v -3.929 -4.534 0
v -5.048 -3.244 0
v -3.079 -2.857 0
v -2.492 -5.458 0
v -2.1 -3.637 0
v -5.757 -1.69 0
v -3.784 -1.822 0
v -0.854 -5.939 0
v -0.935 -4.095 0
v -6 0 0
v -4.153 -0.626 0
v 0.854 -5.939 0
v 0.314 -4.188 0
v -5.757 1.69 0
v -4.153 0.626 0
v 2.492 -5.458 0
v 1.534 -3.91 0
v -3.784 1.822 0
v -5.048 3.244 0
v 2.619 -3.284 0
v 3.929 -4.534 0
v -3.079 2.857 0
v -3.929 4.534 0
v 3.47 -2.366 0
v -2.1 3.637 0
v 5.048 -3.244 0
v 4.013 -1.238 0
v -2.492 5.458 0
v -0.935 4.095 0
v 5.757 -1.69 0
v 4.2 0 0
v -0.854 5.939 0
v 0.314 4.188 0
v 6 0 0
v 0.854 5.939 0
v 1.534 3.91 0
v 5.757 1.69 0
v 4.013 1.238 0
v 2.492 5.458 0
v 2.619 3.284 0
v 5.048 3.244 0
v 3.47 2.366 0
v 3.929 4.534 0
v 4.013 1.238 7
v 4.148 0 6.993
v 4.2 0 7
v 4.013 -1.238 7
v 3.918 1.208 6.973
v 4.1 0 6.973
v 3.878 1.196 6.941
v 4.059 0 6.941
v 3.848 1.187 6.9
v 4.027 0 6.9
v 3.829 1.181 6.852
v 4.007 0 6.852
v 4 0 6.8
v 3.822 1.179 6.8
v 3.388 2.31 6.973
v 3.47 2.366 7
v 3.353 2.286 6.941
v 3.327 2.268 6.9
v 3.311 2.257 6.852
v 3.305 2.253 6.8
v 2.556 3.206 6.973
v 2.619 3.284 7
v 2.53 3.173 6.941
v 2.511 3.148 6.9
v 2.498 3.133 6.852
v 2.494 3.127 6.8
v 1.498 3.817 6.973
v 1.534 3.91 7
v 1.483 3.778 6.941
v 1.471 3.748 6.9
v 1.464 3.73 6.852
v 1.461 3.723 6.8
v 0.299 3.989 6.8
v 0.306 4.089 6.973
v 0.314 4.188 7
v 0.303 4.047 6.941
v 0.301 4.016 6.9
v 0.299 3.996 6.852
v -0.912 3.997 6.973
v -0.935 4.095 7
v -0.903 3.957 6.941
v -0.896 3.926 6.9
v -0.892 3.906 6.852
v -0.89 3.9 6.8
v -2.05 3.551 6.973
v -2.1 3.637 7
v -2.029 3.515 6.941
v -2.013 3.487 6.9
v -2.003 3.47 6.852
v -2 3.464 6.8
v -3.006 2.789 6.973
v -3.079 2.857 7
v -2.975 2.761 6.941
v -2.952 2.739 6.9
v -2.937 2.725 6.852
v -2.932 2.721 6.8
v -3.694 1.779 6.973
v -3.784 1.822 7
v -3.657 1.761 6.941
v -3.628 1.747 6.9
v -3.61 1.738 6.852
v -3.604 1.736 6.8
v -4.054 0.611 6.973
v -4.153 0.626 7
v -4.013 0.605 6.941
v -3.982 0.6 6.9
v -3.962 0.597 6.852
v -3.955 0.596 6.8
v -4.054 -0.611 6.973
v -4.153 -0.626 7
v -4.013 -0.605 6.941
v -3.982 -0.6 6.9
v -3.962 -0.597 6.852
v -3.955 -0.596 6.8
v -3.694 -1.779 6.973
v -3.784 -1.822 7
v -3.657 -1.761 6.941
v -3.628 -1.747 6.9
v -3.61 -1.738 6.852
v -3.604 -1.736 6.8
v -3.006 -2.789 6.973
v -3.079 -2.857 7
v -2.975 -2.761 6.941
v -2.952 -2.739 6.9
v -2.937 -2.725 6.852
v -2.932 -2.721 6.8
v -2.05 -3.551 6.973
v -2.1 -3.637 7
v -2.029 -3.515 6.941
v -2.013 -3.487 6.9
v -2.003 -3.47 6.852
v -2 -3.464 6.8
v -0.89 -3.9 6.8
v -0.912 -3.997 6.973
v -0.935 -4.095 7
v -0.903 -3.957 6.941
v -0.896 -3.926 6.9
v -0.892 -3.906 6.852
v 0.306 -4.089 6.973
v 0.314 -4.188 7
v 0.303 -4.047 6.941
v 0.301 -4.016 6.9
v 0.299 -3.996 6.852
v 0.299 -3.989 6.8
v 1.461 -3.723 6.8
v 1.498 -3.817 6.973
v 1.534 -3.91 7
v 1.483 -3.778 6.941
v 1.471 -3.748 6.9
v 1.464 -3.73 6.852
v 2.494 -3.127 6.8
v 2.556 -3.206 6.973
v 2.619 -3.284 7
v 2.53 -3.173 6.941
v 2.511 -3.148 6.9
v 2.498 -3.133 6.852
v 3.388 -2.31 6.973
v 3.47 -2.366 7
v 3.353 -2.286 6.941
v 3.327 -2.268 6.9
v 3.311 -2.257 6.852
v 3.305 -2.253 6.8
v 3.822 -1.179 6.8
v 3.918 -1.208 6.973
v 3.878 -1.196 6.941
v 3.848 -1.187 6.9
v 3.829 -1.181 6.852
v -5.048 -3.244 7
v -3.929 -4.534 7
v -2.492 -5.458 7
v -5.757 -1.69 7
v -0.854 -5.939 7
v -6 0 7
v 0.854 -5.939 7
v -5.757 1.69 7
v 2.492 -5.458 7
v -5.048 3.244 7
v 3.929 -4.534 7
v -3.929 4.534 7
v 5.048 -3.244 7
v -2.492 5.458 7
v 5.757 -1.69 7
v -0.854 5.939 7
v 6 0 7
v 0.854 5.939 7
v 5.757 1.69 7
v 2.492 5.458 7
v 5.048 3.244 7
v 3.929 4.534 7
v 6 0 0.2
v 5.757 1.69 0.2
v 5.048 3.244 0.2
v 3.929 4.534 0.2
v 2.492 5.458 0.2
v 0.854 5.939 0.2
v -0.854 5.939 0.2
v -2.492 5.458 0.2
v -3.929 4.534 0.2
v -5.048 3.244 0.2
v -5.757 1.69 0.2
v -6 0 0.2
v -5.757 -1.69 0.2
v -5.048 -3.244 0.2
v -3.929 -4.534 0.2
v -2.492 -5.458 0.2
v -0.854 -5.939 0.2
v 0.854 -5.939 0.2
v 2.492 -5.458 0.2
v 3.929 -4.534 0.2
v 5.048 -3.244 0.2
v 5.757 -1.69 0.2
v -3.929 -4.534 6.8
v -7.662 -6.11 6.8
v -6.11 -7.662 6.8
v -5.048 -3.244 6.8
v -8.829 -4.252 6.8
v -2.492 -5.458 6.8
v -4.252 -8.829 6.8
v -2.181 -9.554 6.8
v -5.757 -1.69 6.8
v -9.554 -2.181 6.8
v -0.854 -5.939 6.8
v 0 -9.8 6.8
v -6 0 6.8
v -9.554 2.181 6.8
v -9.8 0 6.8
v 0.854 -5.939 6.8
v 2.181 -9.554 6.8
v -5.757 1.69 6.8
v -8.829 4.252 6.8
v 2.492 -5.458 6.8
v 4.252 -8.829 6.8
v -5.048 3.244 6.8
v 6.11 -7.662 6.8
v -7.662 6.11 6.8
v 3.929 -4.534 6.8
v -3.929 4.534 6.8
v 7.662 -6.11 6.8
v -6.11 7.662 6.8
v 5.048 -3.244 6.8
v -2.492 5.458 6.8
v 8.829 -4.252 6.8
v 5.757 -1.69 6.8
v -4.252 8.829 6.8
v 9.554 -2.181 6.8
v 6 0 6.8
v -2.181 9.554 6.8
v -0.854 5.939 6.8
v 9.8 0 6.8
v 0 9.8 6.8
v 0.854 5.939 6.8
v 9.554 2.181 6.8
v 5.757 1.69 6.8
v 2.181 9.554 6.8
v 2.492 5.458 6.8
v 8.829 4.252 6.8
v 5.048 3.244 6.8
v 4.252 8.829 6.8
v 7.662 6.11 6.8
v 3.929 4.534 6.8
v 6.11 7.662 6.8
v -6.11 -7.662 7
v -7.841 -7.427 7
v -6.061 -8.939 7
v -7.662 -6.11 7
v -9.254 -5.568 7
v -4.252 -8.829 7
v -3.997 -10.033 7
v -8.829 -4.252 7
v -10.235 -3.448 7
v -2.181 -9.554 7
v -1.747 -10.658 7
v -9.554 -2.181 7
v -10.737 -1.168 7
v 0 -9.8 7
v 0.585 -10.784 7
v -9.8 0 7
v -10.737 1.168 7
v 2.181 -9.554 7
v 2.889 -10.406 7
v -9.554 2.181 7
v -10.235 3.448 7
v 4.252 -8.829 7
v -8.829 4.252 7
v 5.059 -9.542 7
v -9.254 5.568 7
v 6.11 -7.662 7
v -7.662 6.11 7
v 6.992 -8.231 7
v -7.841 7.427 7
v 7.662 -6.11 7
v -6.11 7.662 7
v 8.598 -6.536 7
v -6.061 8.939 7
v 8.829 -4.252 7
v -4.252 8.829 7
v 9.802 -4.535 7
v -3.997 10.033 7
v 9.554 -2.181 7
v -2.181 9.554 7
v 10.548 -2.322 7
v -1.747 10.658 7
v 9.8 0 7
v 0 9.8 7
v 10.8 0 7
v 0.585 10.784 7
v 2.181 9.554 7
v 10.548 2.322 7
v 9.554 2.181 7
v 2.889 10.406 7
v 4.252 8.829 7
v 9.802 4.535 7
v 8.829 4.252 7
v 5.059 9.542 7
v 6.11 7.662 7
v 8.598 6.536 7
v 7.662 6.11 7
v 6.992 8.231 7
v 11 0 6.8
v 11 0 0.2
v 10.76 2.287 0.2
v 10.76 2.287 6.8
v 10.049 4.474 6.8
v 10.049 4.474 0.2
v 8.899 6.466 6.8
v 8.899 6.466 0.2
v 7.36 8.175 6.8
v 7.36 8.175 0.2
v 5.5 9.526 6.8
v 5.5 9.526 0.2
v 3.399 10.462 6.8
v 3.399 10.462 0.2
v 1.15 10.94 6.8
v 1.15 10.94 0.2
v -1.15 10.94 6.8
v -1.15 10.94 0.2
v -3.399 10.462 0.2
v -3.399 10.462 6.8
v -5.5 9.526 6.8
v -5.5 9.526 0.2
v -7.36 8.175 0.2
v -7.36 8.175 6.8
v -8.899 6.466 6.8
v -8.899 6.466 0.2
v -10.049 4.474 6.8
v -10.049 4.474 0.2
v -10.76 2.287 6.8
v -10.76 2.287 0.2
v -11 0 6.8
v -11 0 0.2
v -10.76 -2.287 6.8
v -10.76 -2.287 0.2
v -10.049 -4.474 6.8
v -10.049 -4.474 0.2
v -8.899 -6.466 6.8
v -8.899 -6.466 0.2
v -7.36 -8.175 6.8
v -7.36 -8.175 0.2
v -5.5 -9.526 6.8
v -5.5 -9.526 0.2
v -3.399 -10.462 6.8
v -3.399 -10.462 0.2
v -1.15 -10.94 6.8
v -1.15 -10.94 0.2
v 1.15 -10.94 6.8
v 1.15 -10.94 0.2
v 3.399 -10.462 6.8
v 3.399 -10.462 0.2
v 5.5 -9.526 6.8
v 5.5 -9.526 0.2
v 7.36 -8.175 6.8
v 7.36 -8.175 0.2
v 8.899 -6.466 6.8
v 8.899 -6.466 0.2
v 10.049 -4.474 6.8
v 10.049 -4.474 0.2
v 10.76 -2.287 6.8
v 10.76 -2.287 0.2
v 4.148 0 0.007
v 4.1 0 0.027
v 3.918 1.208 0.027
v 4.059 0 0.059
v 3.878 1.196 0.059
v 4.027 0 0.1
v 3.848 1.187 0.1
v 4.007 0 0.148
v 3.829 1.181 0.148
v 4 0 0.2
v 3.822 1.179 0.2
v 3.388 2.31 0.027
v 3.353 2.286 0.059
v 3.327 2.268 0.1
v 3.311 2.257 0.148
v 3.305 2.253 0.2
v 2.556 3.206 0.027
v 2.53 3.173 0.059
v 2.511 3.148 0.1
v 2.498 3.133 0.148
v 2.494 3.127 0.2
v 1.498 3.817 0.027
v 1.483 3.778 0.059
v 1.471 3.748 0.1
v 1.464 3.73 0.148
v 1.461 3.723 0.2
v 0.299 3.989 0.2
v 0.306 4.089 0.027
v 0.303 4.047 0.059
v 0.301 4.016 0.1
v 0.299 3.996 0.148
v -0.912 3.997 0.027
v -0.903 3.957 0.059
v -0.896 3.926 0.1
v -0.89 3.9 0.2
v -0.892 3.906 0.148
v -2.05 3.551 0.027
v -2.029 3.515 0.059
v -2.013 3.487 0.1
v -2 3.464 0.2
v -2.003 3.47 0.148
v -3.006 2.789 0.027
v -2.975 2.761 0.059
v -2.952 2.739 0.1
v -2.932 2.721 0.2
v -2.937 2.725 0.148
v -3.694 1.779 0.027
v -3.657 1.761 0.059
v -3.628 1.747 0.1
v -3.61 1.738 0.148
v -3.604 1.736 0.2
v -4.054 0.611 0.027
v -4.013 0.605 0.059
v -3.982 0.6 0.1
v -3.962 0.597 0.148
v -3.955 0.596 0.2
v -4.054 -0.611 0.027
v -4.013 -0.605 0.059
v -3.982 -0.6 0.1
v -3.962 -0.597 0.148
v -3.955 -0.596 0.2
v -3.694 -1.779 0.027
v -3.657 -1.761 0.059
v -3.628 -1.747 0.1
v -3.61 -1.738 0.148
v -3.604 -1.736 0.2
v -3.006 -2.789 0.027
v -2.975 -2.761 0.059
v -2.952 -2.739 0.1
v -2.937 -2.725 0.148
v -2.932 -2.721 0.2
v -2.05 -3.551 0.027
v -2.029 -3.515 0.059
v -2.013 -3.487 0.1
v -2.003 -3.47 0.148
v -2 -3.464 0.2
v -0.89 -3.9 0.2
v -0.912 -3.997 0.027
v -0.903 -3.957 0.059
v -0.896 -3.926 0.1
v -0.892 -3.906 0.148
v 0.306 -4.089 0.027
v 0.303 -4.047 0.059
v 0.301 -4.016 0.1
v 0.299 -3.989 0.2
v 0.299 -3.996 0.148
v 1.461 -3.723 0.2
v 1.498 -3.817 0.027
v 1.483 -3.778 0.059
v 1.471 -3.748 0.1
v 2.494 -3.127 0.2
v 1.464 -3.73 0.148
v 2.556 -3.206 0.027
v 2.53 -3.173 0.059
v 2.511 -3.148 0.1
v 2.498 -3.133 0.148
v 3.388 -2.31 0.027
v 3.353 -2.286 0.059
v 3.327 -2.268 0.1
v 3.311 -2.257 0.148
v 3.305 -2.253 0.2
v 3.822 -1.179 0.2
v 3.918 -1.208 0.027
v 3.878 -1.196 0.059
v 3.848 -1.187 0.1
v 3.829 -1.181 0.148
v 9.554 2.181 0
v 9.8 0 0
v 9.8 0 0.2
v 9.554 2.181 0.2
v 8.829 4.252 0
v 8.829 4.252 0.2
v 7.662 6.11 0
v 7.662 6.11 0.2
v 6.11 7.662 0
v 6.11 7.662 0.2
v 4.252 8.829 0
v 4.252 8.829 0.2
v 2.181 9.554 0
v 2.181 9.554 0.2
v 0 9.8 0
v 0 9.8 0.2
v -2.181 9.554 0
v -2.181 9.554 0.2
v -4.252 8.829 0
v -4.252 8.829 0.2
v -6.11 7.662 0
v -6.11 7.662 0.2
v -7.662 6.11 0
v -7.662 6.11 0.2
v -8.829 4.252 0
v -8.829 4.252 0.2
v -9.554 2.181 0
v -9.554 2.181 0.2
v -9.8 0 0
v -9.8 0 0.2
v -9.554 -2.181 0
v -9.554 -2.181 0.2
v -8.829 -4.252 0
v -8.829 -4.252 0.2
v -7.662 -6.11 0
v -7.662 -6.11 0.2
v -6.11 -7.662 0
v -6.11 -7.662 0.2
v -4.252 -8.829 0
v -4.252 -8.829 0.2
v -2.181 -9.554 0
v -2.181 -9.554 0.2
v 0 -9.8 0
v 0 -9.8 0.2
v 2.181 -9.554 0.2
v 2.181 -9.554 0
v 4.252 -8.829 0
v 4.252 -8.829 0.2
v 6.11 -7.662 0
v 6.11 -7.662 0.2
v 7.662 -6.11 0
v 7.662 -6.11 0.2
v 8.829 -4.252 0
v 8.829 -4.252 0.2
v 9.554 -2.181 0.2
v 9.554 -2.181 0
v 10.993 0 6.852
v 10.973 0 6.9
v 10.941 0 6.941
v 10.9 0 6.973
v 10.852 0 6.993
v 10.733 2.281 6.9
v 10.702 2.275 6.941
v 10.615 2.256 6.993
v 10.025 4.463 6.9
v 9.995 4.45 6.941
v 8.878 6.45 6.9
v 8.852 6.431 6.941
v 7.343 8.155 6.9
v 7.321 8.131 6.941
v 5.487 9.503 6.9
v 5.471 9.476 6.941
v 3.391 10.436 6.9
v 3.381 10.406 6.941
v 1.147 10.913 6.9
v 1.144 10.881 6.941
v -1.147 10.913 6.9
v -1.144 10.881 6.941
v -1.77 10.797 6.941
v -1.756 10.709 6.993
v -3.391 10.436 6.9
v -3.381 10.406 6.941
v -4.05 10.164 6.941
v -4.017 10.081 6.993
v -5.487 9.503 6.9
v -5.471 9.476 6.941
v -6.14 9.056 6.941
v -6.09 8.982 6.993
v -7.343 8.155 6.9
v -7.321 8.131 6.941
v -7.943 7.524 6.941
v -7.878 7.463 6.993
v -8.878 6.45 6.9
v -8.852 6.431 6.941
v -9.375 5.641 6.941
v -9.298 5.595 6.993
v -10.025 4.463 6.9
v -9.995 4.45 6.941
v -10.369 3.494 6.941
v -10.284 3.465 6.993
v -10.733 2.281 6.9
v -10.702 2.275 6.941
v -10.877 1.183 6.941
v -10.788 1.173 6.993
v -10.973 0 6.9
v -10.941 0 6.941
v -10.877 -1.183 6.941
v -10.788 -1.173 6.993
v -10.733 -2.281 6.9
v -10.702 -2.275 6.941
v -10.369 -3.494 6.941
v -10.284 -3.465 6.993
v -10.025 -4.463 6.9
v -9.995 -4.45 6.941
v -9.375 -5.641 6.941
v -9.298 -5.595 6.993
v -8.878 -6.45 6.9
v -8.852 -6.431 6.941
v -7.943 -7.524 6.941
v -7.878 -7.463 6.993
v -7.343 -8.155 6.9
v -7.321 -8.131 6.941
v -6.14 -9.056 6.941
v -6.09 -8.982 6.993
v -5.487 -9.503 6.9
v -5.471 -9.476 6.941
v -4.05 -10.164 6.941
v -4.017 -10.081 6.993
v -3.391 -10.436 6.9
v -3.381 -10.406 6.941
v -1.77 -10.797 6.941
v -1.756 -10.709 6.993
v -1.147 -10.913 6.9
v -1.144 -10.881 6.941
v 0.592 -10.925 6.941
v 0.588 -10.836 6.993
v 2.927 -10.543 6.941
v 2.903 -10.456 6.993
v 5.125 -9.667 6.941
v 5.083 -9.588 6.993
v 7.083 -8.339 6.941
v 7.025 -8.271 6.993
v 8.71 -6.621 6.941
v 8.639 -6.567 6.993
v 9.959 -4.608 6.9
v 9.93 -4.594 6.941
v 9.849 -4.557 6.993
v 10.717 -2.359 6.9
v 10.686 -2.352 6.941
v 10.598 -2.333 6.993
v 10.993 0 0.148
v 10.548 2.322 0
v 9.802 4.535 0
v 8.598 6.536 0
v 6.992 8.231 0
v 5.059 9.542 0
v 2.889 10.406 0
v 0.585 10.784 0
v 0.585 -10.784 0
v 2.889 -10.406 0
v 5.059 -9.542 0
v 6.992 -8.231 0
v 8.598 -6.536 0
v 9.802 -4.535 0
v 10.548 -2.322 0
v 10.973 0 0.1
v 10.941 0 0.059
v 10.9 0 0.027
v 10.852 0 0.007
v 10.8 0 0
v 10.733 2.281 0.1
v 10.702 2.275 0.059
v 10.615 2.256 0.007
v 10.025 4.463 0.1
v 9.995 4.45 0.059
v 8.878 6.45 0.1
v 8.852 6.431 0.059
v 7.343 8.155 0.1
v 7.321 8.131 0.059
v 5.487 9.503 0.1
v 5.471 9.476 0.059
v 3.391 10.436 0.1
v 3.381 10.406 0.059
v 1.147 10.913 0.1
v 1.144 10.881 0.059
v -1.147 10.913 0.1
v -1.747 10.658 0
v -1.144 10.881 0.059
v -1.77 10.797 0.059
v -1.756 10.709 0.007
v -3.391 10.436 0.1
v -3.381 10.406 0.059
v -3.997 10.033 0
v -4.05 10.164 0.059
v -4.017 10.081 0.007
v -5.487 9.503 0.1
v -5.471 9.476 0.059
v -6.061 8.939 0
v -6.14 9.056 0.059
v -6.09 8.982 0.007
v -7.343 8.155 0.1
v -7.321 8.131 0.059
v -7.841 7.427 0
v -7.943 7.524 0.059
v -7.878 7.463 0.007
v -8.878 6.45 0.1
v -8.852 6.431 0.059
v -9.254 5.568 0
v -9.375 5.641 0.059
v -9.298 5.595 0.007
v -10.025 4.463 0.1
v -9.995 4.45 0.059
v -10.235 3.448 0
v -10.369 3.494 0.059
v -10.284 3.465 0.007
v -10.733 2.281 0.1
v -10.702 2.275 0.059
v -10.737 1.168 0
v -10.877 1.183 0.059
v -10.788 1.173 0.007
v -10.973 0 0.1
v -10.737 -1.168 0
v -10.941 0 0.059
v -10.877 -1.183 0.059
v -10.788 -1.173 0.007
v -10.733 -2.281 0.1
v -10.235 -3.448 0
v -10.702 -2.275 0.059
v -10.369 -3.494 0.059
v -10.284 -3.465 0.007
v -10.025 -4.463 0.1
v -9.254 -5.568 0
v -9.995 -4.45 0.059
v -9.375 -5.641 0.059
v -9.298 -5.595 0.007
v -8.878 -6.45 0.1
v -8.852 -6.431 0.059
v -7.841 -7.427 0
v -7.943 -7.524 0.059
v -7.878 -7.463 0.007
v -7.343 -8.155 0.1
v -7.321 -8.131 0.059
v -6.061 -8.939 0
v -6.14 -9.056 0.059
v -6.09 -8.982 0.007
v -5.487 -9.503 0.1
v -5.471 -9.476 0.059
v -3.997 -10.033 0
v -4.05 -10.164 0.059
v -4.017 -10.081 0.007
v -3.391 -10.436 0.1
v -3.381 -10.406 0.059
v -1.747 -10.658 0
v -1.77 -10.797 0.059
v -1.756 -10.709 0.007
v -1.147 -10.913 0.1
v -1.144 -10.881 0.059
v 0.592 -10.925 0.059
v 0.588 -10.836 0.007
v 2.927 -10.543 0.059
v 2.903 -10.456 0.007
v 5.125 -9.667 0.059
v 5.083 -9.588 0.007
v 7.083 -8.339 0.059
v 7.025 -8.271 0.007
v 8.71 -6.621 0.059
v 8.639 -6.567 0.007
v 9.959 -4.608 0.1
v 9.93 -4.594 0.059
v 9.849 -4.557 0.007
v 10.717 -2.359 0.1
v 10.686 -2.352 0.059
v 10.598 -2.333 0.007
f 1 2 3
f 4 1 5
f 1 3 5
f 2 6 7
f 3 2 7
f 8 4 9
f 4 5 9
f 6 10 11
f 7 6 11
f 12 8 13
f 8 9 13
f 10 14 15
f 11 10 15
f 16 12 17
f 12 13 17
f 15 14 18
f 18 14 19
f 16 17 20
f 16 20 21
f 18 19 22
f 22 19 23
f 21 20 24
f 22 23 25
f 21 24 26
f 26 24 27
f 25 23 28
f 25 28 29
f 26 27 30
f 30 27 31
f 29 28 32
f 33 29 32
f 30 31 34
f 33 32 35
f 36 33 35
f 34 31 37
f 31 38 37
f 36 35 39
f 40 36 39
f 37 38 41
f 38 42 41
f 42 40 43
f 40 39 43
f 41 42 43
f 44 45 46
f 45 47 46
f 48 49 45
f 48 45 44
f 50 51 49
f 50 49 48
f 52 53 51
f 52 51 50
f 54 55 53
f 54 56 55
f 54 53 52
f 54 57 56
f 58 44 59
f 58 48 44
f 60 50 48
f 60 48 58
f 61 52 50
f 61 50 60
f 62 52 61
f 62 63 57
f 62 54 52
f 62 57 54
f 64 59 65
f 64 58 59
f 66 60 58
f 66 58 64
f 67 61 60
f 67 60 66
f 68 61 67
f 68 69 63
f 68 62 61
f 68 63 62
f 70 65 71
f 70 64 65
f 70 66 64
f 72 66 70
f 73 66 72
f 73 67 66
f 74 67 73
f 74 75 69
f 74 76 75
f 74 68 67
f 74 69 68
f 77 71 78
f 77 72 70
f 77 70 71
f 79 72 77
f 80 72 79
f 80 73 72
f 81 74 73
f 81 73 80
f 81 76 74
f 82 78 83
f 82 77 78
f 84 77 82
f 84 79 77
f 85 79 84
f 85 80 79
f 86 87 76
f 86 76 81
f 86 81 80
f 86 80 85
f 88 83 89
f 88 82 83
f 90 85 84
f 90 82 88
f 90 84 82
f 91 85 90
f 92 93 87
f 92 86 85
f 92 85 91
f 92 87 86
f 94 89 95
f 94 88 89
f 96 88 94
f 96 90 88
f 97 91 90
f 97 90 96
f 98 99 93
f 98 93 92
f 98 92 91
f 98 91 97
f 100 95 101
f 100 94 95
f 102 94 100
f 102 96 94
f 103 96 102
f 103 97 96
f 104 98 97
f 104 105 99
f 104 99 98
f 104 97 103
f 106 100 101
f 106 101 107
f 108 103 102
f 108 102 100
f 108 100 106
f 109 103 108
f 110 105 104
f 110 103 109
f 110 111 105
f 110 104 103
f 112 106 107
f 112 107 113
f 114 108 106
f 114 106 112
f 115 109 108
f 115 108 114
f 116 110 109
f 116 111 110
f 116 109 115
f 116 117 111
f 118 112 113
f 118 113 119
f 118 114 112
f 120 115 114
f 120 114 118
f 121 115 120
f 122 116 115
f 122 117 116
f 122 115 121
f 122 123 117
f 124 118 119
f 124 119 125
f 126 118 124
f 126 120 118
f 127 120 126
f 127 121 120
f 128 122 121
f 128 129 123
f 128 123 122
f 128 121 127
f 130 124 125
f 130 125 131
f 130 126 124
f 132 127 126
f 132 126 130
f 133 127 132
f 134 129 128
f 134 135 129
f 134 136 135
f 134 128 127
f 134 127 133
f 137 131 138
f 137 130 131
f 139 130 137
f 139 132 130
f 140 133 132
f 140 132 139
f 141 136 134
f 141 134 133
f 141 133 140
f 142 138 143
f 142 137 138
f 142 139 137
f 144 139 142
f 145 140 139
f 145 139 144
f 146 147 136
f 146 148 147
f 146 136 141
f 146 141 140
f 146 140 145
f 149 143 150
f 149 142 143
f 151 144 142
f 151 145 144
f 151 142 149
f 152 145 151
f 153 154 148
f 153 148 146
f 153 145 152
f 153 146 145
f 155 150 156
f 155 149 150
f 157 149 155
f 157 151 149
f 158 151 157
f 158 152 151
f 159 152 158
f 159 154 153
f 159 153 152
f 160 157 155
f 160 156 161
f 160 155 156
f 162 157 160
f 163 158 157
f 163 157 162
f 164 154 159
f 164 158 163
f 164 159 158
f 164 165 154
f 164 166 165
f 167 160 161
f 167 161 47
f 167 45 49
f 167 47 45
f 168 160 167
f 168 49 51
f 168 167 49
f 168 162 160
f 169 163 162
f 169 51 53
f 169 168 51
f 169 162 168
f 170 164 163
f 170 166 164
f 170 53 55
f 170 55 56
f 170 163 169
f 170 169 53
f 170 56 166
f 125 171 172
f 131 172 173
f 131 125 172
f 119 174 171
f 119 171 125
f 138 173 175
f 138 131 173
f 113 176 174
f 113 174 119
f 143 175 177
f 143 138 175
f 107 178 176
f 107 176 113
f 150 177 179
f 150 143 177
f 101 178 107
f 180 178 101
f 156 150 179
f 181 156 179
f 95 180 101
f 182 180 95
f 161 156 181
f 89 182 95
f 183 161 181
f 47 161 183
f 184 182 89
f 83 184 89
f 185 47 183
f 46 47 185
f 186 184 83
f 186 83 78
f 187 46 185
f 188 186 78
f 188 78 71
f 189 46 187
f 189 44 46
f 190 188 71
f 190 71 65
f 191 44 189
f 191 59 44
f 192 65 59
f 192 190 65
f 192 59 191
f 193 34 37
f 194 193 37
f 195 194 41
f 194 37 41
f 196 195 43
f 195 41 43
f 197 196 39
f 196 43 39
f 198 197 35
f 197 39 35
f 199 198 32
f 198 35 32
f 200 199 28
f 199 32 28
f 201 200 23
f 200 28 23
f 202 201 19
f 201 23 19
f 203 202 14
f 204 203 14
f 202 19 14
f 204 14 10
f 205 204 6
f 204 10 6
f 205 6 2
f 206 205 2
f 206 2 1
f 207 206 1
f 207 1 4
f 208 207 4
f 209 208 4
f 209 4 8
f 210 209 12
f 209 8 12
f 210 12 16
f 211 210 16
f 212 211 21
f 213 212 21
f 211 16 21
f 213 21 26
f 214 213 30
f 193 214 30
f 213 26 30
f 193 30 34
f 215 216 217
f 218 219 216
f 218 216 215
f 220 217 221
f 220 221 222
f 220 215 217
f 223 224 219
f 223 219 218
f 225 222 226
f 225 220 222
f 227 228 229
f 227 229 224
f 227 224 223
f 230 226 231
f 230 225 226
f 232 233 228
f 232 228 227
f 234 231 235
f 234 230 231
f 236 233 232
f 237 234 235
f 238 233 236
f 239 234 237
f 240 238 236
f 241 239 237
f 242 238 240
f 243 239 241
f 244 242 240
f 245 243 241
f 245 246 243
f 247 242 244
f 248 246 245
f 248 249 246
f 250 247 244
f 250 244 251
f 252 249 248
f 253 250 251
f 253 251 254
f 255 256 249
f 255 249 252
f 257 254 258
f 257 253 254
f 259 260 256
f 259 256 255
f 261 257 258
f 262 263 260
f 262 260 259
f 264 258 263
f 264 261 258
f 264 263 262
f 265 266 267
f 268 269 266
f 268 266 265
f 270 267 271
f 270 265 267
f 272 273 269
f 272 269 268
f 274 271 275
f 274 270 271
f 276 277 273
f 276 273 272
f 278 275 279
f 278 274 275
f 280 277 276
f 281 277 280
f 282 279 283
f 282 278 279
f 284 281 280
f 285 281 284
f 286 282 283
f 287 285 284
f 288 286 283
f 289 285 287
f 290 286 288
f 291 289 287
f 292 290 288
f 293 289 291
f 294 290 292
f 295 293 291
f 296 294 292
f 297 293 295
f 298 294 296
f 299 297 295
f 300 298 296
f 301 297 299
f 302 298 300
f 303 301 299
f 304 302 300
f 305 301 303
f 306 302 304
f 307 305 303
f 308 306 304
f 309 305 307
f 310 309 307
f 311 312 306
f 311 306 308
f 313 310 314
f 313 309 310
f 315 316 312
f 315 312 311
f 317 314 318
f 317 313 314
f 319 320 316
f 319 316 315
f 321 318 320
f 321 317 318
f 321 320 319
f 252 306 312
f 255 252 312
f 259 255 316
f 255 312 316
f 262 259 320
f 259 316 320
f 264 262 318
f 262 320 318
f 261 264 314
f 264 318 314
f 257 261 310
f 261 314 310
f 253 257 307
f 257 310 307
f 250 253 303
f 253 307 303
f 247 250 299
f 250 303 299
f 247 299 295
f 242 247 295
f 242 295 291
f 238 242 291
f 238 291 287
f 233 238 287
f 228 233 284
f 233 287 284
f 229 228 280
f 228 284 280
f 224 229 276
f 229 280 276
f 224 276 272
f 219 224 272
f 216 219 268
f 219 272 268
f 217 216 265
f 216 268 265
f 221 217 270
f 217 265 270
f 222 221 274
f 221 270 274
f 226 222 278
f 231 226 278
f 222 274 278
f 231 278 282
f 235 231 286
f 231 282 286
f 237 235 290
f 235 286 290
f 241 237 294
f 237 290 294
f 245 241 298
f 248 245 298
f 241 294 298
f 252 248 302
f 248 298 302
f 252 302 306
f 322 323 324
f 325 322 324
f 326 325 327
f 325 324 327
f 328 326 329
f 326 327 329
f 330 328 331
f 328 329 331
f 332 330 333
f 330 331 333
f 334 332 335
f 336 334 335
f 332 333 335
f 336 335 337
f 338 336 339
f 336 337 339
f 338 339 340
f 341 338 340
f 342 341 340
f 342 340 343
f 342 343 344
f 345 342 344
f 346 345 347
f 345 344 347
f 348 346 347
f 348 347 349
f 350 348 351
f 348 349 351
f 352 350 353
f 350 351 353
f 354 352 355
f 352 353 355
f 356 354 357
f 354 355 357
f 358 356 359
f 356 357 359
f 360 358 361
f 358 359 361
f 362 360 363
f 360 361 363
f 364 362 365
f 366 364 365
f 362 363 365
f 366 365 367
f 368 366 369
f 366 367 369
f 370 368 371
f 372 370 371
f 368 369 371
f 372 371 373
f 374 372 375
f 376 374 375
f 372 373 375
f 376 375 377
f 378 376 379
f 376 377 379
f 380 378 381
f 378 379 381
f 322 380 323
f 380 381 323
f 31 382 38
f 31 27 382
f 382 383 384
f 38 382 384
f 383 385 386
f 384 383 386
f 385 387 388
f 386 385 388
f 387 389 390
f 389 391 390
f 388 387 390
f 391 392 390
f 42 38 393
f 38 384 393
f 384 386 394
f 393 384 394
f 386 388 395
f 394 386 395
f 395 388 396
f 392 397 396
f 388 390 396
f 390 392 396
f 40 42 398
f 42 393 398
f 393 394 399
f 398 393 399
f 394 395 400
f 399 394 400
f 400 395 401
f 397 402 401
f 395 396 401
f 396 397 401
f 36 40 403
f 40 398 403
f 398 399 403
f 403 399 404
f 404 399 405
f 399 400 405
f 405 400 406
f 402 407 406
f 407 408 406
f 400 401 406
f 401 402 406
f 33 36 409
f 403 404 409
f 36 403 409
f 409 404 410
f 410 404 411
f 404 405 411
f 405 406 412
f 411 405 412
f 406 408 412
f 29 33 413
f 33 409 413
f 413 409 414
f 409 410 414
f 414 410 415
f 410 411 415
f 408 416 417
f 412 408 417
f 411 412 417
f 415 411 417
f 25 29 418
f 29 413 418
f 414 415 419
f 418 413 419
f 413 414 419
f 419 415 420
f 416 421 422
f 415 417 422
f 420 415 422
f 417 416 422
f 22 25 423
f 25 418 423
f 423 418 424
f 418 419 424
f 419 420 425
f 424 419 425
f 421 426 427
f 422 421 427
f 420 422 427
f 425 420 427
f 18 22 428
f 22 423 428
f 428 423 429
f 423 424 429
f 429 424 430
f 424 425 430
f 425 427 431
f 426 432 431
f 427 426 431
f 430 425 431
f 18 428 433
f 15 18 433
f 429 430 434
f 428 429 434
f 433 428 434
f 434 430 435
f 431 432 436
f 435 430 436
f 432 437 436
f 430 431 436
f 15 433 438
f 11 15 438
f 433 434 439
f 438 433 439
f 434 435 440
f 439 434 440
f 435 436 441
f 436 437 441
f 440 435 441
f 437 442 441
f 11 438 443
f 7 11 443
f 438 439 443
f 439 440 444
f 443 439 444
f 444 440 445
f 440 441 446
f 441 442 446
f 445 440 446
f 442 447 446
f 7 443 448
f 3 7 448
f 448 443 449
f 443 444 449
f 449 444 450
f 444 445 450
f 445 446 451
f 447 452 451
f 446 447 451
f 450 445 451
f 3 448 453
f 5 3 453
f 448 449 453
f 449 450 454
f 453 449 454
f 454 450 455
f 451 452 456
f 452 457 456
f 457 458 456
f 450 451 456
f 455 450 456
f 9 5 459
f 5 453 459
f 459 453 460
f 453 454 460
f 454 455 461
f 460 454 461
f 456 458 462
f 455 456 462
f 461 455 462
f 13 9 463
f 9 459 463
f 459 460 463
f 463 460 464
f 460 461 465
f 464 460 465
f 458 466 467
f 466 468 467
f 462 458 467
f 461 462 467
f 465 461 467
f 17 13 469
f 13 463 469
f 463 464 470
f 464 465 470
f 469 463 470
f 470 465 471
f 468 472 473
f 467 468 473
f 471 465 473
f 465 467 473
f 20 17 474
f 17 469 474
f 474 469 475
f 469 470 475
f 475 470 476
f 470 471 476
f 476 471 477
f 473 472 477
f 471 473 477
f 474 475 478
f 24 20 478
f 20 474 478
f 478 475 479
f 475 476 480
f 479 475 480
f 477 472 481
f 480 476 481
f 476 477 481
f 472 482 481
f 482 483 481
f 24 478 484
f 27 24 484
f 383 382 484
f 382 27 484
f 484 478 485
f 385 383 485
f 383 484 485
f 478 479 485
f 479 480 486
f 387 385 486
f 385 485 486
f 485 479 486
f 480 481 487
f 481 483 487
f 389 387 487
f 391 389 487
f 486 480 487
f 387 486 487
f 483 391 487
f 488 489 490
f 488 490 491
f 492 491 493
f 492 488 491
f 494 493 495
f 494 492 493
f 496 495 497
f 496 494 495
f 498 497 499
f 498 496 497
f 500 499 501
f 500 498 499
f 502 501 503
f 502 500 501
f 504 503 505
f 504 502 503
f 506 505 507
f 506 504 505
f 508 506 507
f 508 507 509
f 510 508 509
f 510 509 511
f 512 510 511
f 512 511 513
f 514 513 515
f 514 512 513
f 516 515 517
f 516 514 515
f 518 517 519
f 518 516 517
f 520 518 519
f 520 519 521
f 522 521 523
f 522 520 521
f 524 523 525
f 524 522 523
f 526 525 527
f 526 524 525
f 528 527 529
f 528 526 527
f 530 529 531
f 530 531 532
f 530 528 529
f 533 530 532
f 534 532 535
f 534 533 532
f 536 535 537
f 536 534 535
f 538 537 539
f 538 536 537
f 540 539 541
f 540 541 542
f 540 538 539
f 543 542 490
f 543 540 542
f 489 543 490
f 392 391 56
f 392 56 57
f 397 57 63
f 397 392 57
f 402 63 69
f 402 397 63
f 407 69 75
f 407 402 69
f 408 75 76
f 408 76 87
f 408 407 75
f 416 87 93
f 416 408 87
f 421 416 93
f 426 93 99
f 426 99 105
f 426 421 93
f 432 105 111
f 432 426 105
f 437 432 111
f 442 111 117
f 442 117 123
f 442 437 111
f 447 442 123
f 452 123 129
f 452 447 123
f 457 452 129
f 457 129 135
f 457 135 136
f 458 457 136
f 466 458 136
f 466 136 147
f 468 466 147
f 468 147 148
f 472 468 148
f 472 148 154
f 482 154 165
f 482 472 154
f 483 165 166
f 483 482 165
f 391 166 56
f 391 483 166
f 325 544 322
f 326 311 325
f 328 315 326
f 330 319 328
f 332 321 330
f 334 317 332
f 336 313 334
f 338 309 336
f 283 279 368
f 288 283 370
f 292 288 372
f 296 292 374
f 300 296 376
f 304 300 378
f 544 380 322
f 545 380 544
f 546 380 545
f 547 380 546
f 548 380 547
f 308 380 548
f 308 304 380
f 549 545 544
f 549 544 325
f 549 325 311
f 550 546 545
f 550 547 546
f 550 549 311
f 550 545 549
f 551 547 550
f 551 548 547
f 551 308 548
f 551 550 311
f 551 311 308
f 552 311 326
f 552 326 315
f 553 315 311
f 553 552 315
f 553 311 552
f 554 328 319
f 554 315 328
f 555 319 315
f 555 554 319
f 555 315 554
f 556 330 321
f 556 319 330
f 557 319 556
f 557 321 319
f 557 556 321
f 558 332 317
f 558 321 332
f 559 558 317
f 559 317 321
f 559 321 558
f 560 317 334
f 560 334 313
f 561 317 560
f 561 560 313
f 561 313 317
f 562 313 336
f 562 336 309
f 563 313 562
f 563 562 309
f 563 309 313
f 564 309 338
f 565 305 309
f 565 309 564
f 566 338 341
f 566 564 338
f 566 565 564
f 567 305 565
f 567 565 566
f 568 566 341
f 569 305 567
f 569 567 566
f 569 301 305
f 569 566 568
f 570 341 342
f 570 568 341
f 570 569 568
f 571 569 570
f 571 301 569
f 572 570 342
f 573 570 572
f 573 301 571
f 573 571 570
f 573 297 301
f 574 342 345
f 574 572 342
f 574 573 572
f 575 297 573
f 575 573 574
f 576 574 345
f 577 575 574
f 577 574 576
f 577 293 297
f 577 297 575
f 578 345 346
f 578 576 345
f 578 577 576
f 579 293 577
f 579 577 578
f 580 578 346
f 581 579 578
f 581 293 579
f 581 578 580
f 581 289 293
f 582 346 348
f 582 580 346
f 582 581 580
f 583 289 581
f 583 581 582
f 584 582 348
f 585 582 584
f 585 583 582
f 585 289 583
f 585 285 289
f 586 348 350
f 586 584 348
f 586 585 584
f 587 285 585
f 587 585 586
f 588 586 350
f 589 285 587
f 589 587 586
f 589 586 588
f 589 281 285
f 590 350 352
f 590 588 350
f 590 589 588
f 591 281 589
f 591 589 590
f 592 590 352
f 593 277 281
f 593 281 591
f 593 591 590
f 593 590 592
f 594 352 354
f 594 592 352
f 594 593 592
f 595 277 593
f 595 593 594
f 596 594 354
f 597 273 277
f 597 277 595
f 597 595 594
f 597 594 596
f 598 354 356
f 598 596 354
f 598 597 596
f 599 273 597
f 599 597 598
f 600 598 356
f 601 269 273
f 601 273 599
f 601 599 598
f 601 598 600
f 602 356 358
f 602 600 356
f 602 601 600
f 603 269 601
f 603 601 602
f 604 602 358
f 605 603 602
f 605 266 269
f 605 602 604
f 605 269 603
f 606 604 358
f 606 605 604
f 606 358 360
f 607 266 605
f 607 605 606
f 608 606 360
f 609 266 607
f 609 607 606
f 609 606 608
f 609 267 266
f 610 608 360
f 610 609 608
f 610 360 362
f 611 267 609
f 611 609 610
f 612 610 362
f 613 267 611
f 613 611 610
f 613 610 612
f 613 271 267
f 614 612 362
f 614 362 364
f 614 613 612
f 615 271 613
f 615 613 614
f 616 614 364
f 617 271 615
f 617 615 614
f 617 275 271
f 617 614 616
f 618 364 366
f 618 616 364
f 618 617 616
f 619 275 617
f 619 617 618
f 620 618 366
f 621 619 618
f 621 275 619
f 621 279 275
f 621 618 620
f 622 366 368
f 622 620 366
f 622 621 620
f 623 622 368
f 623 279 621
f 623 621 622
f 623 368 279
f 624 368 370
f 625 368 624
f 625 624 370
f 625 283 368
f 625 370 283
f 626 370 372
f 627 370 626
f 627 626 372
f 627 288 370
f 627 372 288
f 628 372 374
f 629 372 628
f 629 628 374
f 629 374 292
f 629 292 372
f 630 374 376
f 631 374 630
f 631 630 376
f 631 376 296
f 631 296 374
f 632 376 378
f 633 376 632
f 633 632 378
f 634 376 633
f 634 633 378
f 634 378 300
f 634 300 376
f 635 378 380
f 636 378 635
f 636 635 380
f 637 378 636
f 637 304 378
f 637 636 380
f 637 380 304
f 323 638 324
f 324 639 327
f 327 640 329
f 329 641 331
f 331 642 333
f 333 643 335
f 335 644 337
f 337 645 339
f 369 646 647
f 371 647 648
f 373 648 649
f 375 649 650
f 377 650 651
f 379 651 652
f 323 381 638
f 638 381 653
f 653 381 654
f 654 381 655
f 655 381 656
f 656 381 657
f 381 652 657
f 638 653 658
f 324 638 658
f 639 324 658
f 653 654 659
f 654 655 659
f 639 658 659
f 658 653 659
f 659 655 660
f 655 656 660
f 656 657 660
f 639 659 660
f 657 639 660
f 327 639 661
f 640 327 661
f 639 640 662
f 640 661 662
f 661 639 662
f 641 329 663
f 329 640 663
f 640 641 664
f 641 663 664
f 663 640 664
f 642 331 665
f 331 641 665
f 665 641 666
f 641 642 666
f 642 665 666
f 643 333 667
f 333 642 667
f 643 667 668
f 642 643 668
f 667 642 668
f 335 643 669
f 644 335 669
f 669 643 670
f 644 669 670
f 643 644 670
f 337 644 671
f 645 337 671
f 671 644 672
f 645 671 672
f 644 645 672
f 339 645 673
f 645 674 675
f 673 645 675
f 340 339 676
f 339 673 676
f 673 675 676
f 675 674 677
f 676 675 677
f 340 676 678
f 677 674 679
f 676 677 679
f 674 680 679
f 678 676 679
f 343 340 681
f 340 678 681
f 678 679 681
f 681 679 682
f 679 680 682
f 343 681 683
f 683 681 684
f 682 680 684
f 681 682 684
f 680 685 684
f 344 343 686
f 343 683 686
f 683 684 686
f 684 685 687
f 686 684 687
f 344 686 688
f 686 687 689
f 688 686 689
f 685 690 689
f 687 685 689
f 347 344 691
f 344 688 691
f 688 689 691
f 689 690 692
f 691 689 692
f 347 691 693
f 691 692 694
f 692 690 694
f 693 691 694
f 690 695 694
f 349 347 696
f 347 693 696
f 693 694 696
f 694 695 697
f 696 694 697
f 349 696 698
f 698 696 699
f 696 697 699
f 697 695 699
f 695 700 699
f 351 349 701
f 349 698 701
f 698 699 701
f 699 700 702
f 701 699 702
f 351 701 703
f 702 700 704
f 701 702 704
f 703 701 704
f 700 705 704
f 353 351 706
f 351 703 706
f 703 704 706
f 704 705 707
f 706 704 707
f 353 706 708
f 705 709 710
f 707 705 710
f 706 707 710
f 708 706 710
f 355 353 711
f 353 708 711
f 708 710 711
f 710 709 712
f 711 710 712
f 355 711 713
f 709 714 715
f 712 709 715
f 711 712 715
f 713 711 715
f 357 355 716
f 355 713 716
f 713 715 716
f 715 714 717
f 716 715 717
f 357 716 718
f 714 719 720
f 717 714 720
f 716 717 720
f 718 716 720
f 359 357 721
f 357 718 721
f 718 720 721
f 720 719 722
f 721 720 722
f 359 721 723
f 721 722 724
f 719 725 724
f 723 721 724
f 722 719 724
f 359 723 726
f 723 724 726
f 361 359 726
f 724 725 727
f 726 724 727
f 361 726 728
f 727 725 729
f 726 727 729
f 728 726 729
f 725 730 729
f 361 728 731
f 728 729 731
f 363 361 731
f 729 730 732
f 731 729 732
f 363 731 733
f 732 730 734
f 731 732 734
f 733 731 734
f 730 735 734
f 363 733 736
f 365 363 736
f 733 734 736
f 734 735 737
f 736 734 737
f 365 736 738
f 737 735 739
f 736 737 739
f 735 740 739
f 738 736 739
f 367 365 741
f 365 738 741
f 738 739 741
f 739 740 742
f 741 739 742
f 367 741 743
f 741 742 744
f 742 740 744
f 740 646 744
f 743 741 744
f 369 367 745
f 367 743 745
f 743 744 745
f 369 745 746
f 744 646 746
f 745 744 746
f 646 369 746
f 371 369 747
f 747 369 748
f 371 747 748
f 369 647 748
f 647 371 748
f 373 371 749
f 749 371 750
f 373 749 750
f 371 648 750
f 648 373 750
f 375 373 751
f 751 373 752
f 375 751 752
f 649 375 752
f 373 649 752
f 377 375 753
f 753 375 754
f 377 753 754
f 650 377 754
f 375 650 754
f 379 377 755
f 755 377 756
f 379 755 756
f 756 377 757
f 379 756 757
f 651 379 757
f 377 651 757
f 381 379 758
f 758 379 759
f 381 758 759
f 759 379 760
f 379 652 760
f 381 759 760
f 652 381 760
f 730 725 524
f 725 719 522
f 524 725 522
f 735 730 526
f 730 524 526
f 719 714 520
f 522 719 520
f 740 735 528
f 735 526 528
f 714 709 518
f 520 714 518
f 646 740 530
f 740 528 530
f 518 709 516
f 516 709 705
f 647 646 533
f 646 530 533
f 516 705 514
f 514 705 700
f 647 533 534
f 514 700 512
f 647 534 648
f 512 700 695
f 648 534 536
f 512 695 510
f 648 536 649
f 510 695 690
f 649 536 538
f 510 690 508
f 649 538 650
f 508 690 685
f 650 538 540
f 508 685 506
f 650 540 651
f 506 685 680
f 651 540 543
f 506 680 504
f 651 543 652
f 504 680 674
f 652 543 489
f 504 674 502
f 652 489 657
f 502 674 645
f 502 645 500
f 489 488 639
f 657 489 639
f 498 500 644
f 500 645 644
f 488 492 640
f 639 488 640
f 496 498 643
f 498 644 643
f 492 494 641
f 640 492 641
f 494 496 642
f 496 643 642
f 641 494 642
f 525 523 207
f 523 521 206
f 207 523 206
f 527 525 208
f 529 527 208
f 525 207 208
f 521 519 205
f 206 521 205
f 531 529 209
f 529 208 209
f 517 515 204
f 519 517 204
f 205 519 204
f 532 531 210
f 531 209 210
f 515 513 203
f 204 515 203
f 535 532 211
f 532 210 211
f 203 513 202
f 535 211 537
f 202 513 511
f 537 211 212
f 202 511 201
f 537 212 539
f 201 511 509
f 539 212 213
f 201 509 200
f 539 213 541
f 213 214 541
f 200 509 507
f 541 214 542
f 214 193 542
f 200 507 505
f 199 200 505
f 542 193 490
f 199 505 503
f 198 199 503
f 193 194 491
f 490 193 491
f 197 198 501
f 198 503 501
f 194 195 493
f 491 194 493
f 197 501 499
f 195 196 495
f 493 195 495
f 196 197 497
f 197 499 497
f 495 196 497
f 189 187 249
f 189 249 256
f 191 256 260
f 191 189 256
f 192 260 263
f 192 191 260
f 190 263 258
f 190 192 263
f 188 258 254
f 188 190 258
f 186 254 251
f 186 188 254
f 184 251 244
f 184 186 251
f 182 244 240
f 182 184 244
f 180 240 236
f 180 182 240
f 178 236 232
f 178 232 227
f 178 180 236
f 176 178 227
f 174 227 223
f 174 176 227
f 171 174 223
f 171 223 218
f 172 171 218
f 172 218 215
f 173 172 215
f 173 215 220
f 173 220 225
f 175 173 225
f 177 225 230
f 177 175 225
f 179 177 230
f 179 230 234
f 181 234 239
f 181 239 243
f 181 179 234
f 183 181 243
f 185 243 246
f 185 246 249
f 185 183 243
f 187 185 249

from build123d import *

# Parameters (mm, degrees)
SKETCH1_R           = 11
SKETCH1_R_2         = 4
BOSS_EXTRUDE1_DEPTH = 7
SKETCH2_R           = 9.8
SKETCH2_R_2         = 6
CUT_EXTRUDE1_DEPTH  = 0.2
FILLET1_R           = 0.2


with BuildPart() as part:
    # Sketch1 → Boss-Extrude1 (new body)
    with BuildSketch(Plane.XY):
        Circle(SKETCH1_R)
        Circle(SKETCH1_R_2, mode=Mode.SUBTRACT)
    extrude(amount=BOSS_EXTRUDE1_DEPTH)

    # Sketch2 → Cut-Extrude1 (cut)
    with BuildSketch(Plane.XY.offset(7)):
        Circle(SKETCH2_R)
        Circle(SKETCH2_R_2, mode=Mode.SUBTRACT)
    cut_extrude1 = extrude(amount=-CUT_EXTRUDE1_DEPTH, mode=Mode.SUBTRACT)

    # Mirror1: Cut-Extrude1 across plane
    add(cut_extrude1.mirror(Plane.XY.offset(3.5)), mode=Mode.SUBTRACT)

    # Fillet1
    fillet1_edges = [part.edges().sort_by_distance(p)[0] for p in [
        (-11, 0, 0),
        (-11, 0, 7),
        (-4, 0, 0),
        (-4, 0, 7),
    ]]
    fillet(fillet1_edges, radius=FILLET1_R)


solid = part.part
